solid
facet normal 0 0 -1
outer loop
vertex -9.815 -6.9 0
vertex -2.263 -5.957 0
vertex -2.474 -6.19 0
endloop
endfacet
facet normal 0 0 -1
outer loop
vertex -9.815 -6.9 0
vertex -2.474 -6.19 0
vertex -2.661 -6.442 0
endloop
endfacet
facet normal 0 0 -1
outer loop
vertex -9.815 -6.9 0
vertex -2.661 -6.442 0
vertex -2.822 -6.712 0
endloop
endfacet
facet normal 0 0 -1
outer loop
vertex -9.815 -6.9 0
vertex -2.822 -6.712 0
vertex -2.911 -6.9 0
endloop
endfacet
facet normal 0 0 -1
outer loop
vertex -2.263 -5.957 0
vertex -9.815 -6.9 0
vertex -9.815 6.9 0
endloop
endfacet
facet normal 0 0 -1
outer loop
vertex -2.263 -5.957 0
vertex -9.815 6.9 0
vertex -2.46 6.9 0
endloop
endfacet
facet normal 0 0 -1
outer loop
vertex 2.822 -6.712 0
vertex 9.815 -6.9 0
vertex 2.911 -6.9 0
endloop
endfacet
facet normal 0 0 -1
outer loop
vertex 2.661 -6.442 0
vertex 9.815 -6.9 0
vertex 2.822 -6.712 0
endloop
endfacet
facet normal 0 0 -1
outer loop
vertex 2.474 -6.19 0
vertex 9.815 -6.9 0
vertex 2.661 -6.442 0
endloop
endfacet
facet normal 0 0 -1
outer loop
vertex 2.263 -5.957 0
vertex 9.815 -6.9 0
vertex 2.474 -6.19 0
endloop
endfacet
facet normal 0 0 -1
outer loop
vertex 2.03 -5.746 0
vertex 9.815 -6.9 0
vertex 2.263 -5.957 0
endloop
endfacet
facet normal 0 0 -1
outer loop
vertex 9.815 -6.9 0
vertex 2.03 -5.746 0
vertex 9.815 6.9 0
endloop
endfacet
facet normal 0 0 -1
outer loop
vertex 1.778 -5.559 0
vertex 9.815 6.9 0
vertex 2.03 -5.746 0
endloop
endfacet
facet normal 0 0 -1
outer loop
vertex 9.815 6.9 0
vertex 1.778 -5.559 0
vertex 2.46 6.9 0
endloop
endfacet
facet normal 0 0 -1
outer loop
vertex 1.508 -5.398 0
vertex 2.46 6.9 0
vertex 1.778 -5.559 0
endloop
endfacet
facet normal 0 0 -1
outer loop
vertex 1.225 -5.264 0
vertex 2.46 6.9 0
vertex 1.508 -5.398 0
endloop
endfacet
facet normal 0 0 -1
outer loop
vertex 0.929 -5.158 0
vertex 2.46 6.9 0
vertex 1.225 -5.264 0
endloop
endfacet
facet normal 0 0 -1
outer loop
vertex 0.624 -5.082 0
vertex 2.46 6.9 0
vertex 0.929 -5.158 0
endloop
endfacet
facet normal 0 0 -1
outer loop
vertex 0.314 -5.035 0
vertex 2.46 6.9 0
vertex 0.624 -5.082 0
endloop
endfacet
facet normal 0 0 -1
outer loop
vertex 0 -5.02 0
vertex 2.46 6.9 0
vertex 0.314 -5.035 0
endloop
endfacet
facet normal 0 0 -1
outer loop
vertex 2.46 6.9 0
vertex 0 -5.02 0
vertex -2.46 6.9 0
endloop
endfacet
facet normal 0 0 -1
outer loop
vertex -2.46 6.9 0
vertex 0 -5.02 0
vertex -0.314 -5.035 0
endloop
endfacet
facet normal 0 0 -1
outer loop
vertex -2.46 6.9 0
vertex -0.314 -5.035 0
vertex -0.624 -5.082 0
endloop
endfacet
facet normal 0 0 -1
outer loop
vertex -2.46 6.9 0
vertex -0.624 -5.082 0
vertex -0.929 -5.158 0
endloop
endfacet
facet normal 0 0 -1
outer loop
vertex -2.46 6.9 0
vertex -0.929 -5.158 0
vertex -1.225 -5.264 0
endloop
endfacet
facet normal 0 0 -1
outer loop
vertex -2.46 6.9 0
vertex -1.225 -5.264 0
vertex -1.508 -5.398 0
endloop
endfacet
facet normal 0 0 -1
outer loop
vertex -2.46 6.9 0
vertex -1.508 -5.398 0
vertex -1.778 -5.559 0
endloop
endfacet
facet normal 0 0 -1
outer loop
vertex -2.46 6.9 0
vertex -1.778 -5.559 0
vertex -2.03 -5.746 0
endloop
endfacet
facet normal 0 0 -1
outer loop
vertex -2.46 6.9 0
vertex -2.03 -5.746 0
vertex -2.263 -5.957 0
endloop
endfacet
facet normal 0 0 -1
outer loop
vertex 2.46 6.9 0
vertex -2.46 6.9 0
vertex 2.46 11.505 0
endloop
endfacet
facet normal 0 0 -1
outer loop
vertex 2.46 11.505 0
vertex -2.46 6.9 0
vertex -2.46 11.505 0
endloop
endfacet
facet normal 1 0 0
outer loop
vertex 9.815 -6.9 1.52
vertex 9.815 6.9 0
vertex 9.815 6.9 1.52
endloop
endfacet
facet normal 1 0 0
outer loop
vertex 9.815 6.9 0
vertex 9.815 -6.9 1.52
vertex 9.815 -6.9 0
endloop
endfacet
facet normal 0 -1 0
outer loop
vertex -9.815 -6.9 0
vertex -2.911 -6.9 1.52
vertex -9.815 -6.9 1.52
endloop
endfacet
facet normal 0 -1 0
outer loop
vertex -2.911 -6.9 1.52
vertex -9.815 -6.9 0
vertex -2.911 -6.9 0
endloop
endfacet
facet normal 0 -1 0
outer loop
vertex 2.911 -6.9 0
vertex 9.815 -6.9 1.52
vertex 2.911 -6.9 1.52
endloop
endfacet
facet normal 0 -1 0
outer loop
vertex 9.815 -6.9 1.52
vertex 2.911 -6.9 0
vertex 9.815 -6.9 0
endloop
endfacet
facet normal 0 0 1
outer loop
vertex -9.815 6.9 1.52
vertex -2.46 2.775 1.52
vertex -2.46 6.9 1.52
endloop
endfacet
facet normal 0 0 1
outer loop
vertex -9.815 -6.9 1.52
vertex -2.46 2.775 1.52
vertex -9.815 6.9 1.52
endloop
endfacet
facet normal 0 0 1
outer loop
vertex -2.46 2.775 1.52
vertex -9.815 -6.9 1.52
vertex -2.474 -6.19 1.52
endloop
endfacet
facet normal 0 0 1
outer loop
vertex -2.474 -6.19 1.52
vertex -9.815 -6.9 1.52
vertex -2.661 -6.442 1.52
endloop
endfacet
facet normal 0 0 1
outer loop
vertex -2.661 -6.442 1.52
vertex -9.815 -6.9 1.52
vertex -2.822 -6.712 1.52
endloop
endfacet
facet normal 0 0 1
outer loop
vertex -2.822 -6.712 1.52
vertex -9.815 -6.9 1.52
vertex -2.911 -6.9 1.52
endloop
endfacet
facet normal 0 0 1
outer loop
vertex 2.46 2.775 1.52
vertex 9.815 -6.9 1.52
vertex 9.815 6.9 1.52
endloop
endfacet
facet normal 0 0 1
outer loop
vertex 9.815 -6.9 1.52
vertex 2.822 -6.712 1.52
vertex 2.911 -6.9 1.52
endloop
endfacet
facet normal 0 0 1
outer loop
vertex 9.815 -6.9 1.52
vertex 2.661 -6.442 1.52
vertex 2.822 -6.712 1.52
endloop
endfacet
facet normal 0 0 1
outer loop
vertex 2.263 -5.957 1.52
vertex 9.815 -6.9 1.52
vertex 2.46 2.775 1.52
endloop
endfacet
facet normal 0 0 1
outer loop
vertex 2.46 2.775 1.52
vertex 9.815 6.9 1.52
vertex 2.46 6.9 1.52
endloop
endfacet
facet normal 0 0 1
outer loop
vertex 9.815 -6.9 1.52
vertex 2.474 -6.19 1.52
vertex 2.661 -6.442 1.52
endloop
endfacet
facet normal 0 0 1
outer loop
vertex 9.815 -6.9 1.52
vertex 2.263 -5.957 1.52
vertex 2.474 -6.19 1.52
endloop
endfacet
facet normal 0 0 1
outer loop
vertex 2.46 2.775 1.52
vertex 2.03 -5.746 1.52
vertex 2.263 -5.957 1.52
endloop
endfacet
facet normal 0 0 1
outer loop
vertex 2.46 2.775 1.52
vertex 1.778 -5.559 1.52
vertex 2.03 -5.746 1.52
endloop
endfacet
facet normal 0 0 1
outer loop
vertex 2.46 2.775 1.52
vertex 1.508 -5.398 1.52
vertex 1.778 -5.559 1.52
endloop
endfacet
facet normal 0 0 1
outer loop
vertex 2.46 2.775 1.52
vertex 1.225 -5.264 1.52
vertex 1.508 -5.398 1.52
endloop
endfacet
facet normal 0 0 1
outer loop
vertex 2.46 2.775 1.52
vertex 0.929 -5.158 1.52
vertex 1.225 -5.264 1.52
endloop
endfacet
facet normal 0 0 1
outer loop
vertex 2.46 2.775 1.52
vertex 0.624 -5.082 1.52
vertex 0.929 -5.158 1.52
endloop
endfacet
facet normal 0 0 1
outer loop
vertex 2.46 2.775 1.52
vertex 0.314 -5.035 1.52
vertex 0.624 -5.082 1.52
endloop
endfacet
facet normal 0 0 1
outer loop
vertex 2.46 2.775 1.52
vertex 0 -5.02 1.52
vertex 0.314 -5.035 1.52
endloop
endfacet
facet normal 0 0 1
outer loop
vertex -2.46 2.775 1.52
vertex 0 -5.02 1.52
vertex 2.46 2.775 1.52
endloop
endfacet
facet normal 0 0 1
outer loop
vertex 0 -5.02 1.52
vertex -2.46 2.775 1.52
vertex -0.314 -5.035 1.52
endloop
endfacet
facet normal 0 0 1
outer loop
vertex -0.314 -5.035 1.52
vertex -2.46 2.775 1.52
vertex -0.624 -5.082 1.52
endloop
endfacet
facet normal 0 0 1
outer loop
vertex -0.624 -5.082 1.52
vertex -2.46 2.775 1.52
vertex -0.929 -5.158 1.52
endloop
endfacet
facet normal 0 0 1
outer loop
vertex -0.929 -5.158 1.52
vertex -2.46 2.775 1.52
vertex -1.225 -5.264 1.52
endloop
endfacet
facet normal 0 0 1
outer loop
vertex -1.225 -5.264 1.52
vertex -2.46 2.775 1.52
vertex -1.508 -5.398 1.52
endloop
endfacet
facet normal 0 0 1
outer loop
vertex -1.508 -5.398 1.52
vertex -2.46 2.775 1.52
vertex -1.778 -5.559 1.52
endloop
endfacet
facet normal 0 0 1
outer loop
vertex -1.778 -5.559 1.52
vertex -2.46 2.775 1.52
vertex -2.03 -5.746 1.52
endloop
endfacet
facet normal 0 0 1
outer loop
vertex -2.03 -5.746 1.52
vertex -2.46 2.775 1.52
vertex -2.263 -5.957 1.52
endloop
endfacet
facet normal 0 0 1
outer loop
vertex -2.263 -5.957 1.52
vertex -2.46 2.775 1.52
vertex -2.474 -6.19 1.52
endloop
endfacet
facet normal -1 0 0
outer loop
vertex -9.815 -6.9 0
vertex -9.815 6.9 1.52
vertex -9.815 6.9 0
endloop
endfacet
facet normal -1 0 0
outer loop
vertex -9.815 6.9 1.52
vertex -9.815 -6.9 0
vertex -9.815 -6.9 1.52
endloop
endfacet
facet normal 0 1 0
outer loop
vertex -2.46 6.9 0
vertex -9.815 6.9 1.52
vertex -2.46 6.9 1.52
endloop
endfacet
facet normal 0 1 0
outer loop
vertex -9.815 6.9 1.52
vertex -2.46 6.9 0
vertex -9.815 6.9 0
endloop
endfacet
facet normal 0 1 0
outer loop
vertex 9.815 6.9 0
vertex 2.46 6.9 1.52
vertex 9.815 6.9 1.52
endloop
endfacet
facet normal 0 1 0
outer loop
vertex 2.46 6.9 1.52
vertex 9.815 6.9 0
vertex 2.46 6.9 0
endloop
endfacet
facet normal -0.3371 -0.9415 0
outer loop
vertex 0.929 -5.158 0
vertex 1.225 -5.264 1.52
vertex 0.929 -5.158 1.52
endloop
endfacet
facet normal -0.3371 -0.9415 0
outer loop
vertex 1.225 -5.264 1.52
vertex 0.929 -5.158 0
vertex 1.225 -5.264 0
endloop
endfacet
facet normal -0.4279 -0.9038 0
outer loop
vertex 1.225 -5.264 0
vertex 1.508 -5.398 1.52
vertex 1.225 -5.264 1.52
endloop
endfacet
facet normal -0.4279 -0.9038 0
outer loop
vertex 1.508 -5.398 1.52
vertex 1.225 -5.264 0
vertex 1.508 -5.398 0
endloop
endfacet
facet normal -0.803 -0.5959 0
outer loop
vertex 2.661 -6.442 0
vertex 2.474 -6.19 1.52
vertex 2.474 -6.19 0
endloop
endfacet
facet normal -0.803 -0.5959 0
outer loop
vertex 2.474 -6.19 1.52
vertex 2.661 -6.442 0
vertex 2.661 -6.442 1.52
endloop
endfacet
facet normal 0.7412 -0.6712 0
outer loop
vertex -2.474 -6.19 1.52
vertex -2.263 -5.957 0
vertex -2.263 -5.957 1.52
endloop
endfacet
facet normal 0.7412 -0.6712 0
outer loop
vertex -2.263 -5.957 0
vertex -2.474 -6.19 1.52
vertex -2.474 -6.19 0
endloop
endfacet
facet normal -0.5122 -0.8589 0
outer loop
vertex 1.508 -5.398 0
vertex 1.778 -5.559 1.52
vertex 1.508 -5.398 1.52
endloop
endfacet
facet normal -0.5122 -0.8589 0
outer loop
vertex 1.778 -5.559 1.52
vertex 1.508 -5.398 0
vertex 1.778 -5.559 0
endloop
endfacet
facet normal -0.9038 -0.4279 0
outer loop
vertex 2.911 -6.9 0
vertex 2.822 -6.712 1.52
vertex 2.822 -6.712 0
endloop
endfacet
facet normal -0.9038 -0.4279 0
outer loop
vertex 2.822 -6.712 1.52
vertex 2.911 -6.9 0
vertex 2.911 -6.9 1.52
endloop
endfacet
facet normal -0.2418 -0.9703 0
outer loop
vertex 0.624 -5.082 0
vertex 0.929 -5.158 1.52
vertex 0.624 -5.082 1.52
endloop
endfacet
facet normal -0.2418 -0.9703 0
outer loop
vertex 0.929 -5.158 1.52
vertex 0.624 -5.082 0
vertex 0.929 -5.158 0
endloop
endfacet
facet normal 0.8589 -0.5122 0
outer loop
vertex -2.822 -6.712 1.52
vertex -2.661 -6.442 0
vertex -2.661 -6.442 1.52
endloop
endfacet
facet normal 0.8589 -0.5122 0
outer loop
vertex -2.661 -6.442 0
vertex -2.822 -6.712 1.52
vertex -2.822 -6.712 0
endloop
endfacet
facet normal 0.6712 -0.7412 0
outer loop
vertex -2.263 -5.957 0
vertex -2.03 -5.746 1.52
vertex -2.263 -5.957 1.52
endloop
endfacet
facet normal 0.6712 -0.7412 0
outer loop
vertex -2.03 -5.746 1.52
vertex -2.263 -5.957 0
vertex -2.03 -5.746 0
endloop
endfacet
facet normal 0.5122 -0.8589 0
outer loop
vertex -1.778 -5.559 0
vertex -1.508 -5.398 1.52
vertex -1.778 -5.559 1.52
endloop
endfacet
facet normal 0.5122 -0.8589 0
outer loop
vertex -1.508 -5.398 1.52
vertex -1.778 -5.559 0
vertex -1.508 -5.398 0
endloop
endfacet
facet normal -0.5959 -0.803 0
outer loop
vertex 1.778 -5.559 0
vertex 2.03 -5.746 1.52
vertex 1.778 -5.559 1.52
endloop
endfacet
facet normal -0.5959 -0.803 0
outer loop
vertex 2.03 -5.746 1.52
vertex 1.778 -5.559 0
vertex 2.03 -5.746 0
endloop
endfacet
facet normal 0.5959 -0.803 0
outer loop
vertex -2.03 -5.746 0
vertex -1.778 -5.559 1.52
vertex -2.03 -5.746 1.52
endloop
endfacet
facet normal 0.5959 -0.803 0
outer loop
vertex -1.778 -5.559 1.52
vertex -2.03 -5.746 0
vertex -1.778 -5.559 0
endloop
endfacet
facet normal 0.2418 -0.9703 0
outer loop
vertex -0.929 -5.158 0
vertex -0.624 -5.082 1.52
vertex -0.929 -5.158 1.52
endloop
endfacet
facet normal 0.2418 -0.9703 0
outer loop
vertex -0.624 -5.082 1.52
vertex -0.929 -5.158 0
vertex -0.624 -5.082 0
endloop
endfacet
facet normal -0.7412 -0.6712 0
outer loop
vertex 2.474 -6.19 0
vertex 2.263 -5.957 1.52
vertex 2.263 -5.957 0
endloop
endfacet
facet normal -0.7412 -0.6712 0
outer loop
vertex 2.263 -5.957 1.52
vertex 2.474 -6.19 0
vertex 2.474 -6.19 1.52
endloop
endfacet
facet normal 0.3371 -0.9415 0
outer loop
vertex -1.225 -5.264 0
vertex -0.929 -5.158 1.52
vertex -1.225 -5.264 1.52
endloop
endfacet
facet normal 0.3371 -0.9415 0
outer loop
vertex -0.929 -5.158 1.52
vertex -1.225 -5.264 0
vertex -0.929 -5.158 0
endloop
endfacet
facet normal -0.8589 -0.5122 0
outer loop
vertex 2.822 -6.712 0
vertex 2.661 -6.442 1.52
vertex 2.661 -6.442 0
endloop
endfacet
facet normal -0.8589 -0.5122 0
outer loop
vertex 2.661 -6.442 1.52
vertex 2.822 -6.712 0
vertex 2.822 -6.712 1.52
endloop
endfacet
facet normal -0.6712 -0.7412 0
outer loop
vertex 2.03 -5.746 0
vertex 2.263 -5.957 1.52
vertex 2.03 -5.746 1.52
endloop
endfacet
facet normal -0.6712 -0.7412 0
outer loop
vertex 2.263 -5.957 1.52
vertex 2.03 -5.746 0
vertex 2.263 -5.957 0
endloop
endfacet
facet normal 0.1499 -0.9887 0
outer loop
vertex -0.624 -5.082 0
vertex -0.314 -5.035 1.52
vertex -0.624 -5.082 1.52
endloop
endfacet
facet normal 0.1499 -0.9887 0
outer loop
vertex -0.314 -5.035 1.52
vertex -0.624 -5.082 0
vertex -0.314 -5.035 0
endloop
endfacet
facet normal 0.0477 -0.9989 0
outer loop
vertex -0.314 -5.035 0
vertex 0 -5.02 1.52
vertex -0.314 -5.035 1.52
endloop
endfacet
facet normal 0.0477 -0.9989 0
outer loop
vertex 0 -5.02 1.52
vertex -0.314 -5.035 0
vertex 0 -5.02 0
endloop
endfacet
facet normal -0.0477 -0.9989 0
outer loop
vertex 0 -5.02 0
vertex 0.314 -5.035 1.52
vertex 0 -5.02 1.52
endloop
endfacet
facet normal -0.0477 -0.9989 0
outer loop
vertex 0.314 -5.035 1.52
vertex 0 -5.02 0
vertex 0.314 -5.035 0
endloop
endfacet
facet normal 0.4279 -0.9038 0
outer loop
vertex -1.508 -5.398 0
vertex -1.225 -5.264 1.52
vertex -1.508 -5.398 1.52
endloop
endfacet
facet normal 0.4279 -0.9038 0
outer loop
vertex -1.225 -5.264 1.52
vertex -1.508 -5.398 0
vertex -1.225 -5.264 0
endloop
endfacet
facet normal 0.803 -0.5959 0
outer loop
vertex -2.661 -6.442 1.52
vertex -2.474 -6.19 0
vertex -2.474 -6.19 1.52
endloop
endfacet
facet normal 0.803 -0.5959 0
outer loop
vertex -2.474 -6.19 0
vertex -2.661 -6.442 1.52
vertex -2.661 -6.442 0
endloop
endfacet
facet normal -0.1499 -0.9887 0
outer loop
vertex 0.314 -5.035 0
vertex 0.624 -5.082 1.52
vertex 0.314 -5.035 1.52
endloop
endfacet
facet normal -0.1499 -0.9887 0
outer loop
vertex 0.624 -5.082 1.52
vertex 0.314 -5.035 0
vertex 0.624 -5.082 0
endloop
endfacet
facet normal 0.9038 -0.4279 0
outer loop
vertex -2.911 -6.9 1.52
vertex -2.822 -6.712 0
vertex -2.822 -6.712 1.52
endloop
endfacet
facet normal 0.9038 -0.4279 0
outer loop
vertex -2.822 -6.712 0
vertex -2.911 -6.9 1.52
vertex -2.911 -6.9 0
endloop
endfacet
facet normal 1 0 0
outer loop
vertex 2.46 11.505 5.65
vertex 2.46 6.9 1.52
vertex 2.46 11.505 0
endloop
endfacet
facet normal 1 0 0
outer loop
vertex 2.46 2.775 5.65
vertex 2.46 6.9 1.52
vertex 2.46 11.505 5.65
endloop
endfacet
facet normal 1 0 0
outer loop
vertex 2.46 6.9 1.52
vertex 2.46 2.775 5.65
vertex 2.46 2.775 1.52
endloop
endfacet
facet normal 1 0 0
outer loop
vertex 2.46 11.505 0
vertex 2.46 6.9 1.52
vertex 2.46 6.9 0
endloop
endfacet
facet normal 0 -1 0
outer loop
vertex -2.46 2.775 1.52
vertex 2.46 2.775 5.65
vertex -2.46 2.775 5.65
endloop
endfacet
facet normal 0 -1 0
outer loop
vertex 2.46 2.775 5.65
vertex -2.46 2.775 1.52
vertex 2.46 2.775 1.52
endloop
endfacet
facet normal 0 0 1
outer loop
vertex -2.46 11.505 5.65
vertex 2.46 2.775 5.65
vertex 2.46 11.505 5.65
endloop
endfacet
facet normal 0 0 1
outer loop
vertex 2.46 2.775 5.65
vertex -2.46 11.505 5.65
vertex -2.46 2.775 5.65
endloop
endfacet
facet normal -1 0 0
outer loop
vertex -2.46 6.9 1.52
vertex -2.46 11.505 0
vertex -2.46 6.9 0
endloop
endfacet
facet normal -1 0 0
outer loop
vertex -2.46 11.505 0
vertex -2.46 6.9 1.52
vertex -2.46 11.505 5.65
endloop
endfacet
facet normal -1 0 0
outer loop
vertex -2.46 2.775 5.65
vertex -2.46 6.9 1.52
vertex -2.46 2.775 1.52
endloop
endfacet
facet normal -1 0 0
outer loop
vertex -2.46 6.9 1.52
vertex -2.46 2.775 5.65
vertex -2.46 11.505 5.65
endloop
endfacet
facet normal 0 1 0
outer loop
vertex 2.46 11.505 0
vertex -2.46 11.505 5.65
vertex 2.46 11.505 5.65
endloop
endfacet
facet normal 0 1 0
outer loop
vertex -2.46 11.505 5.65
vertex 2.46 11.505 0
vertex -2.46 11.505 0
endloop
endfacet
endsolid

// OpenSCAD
union()
{
    translate([0.0, 7.140000000000001, 0.0])
    {
        linear_extrude(height = 5.65, twist = 0.0, scale = 1.0, slices = 1, center = false)
        {
            scale([4.92, 8.73])
            {
                M8();
            }
        }
    }
    difference()
    {
        linear_extrude(height = 1.52, twist = 0.0, scale = 1.0, slices = 1, center = false)
        {
            scale([19.63, 13.8])
            {
                M8();
            }
        }
        translate([0.0, -8.22, 0.0])
        {
            linear_extrude(height = 2.52, twist = 0.0, scale = 1.0, slices = 1, center = false)
            {
                scale([6.4, 6.4])
                {
                    M101();
                }
            }
        }
    }
}

module M101()
{
    polygon
    (
        points =
        [
            [0.5, 0.0], 
            [0.49759236333609846, 0.0490085701647803], 
            [0.4903926402016152, 0.09754516100806412], 
            [0.4784701678661044, 0.14514233862723117], 
            [0.46193976625564337, 0.1913417161825449], 
            [0.4409606321741775, 0.23569836841299882], 
            [0.4157348061512726, 0.2777851165098011], 
            [0.3865052266813685, 0.31719664208182274], 
            [0.3535533905932738, 0.35355339059327373], 
            [0.31719664208182274, 0.3865052266813685], 
            [0.27778511650980114, 0.4157348061512726], 
            [0.2356983684129989, 0.44096063217417747], 
            [0.19134171618254492, 0.46193976625564337], 
            [0.14514233862723117, 0.47847016786610447], 
            [0.09754516100806417, 0.4903926402016152], 
            [0.049008570164780385, 0.4975923633360984], 
            [3.061616997868383E-17, 0.5], 
            [-0.04900857016478032, 0.49759236333609846], 
            [-0.0975451610080641, 0.4903926402016152], 
            [-0.14514233862723108, 0.47847016786610447], 
            [-0.19134171618254486, 0.46193976625564337], 
            [-0.23569836841299885, 0.4409606321741775], 
            [-0.277785116509801, 0.41573480615127273], 
            [-0.3171966420818227, 0.38650522668136855], 
            [-0.35355339059327373, 0.3535533905932738], 
            [-0.3865052266813685, 0.31719664208182274], 
            [-0.4157348061512727, 0.2777851165098011], 
            [-0.44096063217417747, 0.23569836841299893], 
            [-0.46193976625564337, 0.19134171618254495], 
            [-0.4784701678661044, 0.1451423386272312], 
            [-0.4903926402016152, 0.0975451610080643], 
            [-0.4975923633360984, 0.04900857016478041], 
            [-0.5, 6.123233995736766E-17], 
            [-0.49759236333609846, -0.049008570164780295], 
            [-0.4903926402016152, -0.09754516100806418], 
            [-0.47847016786610447, -0.14514233862723105], 
            [-0.4619397662556434, -0.19134171618254484], 
            [-0.4409606321741775, -0.23569836841299882], 
            [-0.41573480615127273, -0.277785116509801], 
            [-0.38650522668136855, -0.31719664208182263], 
            [-0.35355339059327384, -0.35355339059327373], 
            [-0.31719664208182297, -0.38650522668136833], 
            [-0.2777851165098011, -0.4157348061512726], 
            [-0.23569836841299893, -0.44096063217417747], 
            [-0.19134171618254517, -0.46193976625564326], 
            [-0.14514233862723122, -0.4784701678661044], 
            [-0.09754516100806433, -0.49039264020161516], 
            [-0.049008570164780225, -0.49759236333609846], 
            [-9.184850993605148E-17, -0.5], 
            [0.049008570164780045, -0.49759236333609846], 
            [0.09754516100806415, -0.4903926402016152], 
            [0.14514233862723103, -0.47847016786610447], 
            [0.191341716182545, -0.4619397662556433], 
            [0.2356983684129988, -0.4409606321741775], 
            [0.2777851165098009, -0.41573480615127273], 
            [0.3171966420818228, -0.38650522668136844], 
            [0.3535533905932737, -0.35355339059327384], 
            [0.38650522668136833, -0.31719664208182297], 
            [0.4157348061512726, -0.2777851165098011], 
            [0.4409606321741774, -0.23569836841299896], 
            [0.46193976625564326, -0.1913417161825452], 
            [0.4784701678661044, -0.14514233862723125], 
            [0.49039264020161516, -0.09754516100806436], 
            [0.49759236333609846, -0.04900857016478025]
        ],
        paths =
        [
            [0, 1, 2, 3, 4, 5, 6, 7, 8, 9, 10, 11, 12, 13, 14, 15, 16, 17, 18, 19, 20, 21, 22, 23, 24, 25, 26, 27, 28, 29, 30, 31, 32, 33, 34, 35, 36, 37, 38, 39, 40, 41, 42, 43, 44, 45, 46, 47, 48, 49, 50, 51, 52, 53, 54, 55, 56, 57, 58, 59, 60, 61, 62, 63]
        ]
    );
}

module M8()
{
    polygon
    (
        points =
        [
            [-0.5, -0.5], 
            [0.5, -0.5], 
            [0.5, 0.5], 
            [-0.5, 0.5]
        ],
        paths =
        [
            [0, 1, 2, 3]
        ]
    );
}
